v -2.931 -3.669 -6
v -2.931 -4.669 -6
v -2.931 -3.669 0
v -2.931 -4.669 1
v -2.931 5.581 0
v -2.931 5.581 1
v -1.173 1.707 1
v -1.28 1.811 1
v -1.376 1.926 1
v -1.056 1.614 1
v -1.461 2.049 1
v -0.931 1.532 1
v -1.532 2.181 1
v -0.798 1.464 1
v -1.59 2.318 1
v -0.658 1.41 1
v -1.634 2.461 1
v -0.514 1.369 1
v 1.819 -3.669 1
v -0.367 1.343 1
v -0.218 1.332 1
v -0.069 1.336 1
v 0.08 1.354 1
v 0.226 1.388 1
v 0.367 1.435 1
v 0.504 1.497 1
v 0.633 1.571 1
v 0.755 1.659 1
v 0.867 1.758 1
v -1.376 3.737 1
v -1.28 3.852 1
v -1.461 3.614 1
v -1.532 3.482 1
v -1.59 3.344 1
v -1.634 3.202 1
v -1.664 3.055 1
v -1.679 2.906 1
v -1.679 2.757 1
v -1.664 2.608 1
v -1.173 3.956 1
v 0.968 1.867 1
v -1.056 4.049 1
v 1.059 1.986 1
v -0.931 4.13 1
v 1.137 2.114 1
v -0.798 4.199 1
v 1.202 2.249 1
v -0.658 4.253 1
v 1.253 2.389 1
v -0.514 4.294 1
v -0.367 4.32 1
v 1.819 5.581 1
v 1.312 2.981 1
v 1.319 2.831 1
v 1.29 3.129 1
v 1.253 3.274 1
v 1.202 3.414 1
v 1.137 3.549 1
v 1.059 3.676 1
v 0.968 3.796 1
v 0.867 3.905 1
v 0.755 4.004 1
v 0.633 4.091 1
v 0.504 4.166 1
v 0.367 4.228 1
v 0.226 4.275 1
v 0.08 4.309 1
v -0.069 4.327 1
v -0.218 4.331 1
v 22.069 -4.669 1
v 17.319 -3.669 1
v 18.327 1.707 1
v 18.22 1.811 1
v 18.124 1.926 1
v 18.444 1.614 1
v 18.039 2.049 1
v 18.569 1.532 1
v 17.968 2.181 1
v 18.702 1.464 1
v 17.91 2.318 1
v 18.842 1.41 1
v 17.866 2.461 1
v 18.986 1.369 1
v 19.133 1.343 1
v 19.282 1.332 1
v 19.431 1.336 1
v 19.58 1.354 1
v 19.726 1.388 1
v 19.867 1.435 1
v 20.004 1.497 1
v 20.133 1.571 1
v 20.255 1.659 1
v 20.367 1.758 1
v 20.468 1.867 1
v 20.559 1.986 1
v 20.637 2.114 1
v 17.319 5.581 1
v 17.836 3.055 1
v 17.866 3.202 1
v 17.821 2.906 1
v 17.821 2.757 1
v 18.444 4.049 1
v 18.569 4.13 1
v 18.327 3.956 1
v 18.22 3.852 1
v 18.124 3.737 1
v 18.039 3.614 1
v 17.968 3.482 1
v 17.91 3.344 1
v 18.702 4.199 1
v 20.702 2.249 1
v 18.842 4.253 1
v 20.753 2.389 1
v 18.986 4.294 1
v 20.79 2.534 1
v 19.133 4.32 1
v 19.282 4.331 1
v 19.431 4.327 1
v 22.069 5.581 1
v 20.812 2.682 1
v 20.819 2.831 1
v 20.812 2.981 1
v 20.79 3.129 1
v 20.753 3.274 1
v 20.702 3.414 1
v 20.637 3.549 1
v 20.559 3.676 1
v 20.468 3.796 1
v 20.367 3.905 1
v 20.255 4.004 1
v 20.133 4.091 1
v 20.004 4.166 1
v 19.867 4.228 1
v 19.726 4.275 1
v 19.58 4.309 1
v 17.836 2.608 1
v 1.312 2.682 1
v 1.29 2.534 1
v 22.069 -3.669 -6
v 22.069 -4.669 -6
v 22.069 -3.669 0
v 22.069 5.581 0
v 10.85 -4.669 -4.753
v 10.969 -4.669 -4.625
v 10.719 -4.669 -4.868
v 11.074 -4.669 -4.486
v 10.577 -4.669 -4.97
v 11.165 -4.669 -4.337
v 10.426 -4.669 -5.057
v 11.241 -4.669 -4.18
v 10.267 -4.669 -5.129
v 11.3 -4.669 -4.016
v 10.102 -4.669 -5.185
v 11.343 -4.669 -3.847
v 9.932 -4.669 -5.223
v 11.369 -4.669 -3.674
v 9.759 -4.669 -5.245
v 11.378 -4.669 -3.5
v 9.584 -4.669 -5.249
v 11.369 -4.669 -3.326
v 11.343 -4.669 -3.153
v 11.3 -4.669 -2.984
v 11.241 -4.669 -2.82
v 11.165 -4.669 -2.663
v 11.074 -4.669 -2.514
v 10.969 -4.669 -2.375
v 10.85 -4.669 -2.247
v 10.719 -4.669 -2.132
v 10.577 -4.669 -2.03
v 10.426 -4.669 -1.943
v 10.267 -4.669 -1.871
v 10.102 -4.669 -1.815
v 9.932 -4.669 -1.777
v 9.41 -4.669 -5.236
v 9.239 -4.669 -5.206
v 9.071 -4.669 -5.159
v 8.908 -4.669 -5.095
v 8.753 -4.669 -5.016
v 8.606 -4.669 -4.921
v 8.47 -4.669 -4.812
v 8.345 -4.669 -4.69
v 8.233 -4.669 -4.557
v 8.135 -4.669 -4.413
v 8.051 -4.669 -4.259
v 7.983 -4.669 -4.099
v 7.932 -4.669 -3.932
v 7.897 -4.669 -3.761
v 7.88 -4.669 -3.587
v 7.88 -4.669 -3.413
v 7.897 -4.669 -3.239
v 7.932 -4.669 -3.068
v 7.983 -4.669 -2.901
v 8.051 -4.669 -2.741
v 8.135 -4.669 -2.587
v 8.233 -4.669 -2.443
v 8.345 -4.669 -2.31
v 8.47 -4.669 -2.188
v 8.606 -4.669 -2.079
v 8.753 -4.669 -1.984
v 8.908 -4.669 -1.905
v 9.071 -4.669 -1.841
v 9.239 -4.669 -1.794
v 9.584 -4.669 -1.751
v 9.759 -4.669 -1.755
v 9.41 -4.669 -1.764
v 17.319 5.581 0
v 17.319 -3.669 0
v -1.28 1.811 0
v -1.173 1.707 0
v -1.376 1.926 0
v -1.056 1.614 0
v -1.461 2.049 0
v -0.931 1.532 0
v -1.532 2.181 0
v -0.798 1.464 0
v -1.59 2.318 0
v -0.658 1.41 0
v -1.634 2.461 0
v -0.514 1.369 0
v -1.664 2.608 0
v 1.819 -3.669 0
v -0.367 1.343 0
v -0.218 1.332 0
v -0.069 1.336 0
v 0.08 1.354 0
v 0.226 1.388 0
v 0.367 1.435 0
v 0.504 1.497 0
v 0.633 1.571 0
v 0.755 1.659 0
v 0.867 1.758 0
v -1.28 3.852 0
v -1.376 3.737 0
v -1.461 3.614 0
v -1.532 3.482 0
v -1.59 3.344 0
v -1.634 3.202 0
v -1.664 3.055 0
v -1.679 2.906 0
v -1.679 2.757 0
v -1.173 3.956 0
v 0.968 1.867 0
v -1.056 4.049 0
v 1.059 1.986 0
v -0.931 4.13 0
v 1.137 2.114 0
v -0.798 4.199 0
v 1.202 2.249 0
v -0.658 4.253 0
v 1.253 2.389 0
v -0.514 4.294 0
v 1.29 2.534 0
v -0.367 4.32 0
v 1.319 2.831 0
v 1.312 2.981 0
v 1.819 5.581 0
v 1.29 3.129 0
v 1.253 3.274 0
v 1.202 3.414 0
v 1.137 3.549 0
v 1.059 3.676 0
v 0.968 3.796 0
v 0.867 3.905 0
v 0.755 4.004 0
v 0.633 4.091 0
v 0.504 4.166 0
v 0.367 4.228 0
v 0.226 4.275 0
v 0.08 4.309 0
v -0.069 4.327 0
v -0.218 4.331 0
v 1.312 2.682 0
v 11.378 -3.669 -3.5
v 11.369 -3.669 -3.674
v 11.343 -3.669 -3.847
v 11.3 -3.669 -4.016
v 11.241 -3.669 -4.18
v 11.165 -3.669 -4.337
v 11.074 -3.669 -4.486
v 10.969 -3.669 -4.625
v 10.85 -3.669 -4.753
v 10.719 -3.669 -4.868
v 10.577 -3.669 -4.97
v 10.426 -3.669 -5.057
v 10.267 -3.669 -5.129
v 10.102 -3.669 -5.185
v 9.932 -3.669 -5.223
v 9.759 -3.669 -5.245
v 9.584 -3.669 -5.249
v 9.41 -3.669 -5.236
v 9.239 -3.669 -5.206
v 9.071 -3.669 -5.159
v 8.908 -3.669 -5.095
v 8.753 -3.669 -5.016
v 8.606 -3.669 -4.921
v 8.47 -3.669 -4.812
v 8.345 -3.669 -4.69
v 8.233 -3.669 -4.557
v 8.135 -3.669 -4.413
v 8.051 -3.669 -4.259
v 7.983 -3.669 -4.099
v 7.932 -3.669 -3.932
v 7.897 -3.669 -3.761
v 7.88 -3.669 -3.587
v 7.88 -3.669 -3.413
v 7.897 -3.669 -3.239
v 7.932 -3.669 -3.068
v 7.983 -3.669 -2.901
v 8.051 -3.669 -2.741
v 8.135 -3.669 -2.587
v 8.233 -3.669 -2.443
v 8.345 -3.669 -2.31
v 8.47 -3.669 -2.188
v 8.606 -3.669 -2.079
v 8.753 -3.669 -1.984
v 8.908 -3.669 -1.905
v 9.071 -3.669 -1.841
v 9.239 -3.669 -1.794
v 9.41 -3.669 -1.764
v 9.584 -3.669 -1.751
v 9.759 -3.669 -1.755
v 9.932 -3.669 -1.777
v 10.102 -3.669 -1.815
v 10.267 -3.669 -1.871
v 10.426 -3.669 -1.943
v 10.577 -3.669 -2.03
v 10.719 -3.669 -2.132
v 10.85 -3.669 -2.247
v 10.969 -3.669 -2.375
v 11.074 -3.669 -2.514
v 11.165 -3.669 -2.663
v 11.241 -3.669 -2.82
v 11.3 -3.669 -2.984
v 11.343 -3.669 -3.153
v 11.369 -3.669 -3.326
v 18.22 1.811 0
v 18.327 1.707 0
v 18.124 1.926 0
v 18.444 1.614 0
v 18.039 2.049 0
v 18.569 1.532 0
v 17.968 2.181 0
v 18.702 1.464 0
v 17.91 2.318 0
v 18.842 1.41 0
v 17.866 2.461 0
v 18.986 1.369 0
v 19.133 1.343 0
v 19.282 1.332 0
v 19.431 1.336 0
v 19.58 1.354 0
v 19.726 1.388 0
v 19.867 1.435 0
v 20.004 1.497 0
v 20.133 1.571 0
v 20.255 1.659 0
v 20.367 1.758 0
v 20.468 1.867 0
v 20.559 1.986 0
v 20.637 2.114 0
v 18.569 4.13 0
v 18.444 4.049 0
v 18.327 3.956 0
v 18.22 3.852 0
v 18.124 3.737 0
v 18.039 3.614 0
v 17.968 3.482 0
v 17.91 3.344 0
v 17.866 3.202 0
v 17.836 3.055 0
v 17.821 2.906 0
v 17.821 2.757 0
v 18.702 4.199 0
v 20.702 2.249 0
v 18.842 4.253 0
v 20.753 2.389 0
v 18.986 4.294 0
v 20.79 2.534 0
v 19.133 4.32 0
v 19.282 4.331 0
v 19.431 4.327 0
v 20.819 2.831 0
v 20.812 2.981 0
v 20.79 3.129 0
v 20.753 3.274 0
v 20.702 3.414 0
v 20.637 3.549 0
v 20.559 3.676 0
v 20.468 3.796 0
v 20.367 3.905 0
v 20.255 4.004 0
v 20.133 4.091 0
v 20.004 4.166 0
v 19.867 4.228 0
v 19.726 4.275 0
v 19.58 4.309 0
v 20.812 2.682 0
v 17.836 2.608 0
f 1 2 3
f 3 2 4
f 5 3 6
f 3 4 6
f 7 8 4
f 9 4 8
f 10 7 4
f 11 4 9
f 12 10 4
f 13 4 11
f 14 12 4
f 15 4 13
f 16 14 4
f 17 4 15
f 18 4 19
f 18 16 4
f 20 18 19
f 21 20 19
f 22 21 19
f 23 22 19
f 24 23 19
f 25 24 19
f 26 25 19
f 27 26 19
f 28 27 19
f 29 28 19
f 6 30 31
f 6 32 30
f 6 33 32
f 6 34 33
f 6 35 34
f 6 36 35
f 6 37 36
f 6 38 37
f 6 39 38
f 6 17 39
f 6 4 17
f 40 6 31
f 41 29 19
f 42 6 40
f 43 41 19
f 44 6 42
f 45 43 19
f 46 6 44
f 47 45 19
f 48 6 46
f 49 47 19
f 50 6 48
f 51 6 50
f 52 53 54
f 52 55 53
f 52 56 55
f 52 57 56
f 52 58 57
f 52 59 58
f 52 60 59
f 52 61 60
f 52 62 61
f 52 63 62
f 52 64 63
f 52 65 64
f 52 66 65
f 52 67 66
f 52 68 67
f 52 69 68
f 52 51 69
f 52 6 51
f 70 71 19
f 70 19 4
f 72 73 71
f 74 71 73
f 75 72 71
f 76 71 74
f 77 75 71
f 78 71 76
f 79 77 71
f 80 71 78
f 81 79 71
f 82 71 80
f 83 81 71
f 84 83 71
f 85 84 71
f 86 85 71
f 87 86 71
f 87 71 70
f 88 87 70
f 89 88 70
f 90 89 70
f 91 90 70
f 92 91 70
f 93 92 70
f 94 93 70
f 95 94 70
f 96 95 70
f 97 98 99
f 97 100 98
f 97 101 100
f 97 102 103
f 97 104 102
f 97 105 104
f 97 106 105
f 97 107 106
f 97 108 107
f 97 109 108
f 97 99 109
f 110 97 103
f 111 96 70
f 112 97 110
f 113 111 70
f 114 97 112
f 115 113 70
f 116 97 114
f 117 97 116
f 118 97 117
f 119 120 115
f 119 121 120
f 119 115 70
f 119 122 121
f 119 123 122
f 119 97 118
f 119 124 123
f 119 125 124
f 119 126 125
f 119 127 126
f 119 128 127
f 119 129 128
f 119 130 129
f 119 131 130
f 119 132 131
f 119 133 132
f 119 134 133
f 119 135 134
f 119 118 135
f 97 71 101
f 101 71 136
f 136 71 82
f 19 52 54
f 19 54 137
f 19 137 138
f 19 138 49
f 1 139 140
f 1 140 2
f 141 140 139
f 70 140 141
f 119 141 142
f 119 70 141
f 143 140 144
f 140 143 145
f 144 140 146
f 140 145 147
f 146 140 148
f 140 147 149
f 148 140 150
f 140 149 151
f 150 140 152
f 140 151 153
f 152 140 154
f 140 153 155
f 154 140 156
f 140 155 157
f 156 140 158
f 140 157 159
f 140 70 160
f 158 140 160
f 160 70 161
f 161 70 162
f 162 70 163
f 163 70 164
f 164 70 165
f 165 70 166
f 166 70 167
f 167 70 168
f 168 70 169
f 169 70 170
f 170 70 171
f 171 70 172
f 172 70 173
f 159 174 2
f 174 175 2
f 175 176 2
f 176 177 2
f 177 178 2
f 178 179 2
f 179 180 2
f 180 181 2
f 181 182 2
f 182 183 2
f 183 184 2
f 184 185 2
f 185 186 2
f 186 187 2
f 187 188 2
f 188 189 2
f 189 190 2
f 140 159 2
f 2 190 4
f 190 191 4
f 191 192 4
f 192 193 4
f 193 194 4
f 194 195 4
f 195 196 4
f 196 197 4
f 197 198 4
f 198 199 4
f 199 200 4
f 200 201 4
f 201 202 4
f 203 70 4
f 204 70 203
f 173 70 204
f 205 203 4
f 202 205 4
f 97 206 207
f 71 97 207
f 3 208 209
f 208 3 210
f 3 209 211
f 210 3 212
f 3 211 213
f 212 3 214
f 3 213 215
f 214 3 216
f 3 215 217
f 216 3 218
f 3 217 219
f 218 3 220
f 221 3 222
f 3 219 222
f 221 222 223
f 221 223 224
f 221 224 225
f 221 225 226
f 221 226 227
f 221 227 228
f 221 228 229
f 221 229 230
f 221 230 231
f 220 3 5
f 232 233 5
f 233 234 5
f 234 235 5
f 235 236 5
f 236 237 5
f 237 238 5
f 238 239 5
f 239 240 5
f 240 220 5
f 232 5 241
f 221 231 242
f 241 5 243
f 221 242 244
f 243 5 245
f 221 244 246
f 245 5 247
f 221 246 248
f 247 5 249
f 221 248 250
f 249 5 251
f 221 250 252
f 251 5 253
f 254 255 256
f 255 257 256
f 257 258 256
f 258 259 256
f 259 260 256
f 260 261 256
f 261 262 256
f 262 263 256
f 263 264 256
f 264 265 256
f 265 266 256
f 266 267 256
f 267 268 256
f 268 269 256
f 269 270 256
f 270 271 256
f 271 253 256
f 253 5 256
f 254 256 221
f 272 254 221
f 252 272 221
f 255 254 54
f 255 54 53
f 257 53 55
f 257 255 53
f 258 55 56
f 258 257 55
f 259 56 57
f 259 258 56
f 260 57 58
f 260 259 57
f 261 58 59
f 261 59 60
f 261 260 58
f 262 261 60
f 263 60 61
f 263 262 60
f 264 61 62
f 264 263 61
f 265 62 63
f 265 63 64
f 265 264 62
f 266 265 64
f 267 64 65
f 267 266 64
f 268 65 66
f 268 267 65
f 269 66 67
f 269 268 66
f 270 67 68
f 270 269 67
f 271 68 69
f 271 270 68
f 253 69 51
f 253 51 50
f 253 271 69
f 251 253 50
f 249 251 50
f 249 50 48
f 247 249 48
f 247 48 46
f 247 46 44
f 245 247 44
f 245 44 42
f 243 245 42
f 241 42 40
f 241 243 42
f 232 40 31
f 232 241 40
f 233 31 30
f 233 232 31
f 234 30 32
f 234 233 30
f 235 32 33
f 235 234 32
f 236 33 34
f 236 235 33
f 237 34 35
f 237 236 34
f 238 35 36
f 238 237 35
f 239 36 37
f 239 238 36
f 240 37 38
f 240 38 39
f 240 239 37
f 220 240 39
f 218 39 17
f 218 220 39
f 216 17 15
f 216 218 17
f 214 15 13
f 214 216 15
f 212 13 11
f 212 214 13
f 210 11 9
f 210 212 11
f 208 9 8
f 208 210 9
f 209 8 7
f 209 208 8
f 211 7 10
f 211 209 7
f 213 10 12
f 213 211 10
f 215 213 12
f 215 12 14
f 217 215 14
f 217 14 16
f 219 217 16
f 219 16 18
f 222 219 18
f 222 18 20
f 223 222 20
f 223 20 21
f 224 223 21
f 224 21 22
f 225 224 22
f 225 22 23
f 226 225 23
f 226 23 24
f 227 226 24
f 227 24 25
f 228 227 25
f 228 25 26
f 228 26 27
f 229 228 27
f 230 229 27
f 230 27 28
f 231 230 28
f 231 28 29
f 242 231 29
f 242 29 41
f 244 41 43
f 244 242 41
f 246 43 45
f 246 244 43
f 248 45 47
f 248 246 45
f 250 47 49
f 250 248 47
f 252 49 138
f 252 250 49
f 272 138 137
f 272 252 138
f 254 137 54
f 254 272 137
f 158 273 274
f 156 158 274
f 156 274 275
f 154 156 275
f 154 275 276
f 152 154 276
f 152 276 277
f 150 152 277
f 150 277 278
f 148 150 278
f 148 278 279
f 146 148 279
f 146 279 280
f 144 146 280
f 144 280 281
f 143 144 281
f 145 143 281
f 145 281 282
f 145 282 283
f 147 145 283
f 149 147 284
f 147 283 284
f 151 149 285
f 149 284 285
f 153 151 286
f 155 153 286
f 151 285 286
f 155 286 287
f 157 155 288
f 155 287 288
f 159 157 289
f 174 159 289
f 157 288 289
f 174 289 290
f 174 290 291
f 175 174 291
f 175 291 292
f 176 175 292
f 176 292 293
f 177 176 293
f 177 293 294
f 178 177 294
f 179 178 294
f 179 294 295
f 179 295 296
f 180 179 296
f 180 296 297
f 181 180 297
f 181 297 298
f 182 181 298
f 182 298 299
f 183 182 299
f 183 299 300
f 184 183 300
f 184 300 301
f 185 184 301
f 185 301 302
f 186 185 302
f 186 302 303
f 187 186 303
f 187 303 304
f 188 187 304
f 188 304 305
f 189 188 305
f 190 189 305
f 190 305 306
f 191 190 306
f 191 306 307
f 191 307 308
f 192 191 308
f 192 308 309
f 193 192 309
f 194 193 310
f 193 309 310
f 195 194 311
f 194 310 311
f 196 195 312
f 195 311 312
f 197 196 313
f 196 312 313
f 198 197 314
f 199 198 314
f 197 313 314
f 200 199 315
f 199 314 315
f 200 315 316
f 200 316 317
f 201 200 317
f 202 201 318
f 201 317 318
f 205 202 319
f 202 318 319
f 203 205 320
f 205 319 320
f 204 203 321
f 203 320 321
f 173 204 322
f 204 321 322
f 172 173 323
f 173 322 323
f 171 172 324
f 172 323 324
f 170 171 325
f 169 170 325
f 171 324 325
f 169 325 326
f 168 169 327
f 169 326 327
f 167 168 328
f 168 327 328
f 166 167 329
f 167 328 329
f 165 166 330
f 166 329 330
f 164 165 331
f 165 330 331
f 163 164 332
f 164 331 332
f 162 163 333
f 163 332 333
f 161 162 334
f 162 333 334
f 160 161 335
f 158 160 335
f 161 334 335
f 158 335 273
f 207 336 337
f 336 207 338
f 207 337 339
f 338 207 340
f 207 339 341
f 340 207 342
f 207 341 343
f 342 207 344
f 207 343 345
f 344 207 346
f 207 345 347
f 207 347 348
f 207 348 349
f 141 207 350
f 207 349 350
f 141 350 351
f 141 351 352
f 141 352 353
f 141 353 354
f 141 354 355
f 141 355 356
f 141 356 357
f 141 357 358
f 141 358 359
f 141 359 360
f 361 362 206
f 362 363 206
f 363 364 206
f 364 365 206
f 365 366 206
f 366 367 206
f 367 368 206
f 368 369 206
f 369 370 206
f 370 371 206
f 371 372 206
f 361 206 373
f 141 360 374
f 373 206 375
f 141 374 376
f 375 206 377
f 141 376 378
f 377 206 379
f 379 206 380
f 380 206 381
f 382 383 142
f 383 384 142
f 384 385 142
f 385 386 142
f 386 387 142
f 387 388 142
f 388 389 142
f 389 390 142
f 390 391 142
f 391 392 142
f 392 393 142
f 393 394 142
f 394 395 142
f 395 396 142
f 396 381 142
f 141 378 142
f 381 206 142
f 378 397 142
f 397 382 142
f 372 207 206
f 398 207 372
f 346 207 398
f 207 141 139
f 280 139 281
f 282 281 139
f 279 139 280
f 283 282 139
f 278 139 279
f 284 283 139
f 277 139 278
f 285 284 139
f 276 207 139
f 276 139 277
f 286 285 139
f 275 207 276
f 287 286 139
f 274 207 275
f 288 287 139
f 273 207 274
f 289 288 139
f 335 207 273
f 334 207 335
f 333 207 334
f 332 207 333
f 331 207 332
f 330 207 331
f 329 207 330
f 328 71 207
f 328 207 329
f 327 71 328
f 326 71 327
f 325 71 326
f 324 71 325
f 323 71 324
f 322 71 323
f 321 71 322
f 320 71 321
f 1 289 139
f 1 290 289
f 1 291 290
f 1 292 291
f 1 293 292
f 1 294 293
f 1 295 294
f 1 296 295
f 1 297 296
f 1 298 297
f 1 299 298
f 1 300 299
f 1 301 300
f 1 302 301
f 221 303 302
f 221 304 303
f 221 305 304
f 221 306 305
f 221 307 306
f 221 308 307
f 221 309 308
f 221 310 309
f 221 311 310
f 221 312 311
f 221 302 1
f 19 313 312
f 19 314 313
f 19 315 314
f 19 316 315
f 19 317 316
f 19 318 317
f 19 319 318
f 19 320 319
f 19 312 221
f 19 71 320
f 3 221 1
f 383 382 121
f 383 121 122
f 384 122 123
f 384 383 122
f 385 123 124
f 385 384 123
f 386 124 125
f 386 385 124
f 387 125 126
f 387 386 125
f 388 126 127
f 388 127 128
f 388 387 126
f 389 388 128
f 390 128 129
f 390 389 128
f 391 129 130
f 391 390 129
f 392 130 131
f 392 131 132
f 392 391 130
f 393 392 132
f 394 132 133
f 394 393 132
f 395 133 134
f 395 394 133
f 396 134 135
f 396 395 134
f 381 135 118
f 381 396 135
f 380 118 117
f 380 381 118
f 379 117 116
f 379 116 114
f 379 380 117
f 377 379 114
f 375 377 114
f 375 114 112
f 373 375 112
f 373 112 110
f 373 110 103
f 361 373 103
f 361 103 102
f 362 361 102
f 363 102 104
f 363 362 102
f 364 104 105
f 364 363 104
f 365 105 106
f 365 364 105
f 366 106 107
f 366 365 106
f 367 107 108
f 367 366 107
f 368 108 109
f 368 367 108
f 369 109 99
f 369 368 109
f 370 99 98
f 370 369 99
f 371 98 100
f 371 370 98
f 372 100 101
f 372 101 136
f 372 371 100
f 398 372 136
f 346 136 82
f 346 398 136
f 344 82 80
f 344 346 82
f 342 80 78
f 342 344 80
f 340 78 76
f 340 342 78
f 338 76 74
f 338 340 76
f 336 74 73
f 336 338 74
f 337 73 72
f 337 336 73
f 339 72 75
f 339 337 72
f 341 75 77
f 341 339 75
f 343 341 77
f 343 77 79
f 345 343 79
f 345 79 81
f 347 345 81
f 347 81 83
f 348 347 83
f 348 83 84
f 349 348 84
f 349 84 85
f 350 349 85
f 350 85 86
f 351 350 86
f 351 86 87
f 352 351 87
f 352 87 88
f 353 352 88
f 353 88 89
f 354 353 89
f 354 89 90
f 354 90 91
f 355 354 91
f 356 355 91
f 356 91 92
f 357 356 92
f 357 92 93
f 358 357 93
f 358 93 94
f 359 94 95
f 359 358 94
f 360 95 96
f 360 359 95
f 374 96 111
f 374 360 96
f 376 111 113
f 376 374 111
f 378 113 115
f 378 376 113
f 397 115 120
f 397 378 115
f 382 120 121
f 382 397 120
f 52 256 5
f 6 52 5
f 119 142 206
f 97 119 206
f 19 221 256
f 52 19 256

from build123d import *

# Parameters (mm, degrees)
ESBO_O1_R                = 1.5
RESSALTO_EXTRUS_O1_DEPTH = 1
ESBO_O2_W                = 25
ESBO_O2_H                = 1
RESSALTO_EXTRUS_O2_DEPTH = 6
ESBO_O3_R                = 1.75
CORTE_EXTRUS_O1_DEPTH    = 5


with BuildPart() as part:
    # Esboço1 → Ressalto-extrusão1 (new body)
    with BuildSketch(Plane.XY):
        Polygon((-2.930659551, 5.581459362), (-2.930659551, -4.668540638), (22.069340449, -4.668540638), (22.069340449, 5.581459362), (17.319340449, 5.581459362), (17.319340449, -3.668540638), (1.819340449, -3.668540638), (1.819340449, 5.581459362), align=None)
        with Locations((-0.180659551, 2.831459362)):
            Circle(ESBO_O1_R, mode=Mode.SUBTRACT)
        with Locations((19.319340449, 2.831459362)):
            Circle(ESBO_O1_R, mode=Mode.SUBTRACT)
    extrude(amount=RESSALTO_EXTRUS_O1_DEPTH)

    # Esboço2 → Ressalto-extrusão2 (add)
    with BuildSketch(Plane(origin=(0, 0, 0), x_dir=(-1, 0, 0), z_dir=(0, 0, -1))):
        with Locations((-9.569340449, -4.168540638)):
            Rectangle(ESBO_O2_W, ESBO_O2_H)
    extrude(amount=RESSALTO_EXTRUS_O2_DEPTH)

    # Esboço3 → Corte-extrusão1 (cut)
    with BuildSketch(Plane(origin=(0, -3.668540638, 0), x_dir=(1, 0, 0), z_dir=(0, 1, 0))):
        with Locations((9.627945133, 3.5)):
            Circle(ESBO_O3_R)
    extrude(amount=-CORTE_EXTRUS_O1_DEPTH, mode=Mode.SUBTRACT)


solid = part.part
